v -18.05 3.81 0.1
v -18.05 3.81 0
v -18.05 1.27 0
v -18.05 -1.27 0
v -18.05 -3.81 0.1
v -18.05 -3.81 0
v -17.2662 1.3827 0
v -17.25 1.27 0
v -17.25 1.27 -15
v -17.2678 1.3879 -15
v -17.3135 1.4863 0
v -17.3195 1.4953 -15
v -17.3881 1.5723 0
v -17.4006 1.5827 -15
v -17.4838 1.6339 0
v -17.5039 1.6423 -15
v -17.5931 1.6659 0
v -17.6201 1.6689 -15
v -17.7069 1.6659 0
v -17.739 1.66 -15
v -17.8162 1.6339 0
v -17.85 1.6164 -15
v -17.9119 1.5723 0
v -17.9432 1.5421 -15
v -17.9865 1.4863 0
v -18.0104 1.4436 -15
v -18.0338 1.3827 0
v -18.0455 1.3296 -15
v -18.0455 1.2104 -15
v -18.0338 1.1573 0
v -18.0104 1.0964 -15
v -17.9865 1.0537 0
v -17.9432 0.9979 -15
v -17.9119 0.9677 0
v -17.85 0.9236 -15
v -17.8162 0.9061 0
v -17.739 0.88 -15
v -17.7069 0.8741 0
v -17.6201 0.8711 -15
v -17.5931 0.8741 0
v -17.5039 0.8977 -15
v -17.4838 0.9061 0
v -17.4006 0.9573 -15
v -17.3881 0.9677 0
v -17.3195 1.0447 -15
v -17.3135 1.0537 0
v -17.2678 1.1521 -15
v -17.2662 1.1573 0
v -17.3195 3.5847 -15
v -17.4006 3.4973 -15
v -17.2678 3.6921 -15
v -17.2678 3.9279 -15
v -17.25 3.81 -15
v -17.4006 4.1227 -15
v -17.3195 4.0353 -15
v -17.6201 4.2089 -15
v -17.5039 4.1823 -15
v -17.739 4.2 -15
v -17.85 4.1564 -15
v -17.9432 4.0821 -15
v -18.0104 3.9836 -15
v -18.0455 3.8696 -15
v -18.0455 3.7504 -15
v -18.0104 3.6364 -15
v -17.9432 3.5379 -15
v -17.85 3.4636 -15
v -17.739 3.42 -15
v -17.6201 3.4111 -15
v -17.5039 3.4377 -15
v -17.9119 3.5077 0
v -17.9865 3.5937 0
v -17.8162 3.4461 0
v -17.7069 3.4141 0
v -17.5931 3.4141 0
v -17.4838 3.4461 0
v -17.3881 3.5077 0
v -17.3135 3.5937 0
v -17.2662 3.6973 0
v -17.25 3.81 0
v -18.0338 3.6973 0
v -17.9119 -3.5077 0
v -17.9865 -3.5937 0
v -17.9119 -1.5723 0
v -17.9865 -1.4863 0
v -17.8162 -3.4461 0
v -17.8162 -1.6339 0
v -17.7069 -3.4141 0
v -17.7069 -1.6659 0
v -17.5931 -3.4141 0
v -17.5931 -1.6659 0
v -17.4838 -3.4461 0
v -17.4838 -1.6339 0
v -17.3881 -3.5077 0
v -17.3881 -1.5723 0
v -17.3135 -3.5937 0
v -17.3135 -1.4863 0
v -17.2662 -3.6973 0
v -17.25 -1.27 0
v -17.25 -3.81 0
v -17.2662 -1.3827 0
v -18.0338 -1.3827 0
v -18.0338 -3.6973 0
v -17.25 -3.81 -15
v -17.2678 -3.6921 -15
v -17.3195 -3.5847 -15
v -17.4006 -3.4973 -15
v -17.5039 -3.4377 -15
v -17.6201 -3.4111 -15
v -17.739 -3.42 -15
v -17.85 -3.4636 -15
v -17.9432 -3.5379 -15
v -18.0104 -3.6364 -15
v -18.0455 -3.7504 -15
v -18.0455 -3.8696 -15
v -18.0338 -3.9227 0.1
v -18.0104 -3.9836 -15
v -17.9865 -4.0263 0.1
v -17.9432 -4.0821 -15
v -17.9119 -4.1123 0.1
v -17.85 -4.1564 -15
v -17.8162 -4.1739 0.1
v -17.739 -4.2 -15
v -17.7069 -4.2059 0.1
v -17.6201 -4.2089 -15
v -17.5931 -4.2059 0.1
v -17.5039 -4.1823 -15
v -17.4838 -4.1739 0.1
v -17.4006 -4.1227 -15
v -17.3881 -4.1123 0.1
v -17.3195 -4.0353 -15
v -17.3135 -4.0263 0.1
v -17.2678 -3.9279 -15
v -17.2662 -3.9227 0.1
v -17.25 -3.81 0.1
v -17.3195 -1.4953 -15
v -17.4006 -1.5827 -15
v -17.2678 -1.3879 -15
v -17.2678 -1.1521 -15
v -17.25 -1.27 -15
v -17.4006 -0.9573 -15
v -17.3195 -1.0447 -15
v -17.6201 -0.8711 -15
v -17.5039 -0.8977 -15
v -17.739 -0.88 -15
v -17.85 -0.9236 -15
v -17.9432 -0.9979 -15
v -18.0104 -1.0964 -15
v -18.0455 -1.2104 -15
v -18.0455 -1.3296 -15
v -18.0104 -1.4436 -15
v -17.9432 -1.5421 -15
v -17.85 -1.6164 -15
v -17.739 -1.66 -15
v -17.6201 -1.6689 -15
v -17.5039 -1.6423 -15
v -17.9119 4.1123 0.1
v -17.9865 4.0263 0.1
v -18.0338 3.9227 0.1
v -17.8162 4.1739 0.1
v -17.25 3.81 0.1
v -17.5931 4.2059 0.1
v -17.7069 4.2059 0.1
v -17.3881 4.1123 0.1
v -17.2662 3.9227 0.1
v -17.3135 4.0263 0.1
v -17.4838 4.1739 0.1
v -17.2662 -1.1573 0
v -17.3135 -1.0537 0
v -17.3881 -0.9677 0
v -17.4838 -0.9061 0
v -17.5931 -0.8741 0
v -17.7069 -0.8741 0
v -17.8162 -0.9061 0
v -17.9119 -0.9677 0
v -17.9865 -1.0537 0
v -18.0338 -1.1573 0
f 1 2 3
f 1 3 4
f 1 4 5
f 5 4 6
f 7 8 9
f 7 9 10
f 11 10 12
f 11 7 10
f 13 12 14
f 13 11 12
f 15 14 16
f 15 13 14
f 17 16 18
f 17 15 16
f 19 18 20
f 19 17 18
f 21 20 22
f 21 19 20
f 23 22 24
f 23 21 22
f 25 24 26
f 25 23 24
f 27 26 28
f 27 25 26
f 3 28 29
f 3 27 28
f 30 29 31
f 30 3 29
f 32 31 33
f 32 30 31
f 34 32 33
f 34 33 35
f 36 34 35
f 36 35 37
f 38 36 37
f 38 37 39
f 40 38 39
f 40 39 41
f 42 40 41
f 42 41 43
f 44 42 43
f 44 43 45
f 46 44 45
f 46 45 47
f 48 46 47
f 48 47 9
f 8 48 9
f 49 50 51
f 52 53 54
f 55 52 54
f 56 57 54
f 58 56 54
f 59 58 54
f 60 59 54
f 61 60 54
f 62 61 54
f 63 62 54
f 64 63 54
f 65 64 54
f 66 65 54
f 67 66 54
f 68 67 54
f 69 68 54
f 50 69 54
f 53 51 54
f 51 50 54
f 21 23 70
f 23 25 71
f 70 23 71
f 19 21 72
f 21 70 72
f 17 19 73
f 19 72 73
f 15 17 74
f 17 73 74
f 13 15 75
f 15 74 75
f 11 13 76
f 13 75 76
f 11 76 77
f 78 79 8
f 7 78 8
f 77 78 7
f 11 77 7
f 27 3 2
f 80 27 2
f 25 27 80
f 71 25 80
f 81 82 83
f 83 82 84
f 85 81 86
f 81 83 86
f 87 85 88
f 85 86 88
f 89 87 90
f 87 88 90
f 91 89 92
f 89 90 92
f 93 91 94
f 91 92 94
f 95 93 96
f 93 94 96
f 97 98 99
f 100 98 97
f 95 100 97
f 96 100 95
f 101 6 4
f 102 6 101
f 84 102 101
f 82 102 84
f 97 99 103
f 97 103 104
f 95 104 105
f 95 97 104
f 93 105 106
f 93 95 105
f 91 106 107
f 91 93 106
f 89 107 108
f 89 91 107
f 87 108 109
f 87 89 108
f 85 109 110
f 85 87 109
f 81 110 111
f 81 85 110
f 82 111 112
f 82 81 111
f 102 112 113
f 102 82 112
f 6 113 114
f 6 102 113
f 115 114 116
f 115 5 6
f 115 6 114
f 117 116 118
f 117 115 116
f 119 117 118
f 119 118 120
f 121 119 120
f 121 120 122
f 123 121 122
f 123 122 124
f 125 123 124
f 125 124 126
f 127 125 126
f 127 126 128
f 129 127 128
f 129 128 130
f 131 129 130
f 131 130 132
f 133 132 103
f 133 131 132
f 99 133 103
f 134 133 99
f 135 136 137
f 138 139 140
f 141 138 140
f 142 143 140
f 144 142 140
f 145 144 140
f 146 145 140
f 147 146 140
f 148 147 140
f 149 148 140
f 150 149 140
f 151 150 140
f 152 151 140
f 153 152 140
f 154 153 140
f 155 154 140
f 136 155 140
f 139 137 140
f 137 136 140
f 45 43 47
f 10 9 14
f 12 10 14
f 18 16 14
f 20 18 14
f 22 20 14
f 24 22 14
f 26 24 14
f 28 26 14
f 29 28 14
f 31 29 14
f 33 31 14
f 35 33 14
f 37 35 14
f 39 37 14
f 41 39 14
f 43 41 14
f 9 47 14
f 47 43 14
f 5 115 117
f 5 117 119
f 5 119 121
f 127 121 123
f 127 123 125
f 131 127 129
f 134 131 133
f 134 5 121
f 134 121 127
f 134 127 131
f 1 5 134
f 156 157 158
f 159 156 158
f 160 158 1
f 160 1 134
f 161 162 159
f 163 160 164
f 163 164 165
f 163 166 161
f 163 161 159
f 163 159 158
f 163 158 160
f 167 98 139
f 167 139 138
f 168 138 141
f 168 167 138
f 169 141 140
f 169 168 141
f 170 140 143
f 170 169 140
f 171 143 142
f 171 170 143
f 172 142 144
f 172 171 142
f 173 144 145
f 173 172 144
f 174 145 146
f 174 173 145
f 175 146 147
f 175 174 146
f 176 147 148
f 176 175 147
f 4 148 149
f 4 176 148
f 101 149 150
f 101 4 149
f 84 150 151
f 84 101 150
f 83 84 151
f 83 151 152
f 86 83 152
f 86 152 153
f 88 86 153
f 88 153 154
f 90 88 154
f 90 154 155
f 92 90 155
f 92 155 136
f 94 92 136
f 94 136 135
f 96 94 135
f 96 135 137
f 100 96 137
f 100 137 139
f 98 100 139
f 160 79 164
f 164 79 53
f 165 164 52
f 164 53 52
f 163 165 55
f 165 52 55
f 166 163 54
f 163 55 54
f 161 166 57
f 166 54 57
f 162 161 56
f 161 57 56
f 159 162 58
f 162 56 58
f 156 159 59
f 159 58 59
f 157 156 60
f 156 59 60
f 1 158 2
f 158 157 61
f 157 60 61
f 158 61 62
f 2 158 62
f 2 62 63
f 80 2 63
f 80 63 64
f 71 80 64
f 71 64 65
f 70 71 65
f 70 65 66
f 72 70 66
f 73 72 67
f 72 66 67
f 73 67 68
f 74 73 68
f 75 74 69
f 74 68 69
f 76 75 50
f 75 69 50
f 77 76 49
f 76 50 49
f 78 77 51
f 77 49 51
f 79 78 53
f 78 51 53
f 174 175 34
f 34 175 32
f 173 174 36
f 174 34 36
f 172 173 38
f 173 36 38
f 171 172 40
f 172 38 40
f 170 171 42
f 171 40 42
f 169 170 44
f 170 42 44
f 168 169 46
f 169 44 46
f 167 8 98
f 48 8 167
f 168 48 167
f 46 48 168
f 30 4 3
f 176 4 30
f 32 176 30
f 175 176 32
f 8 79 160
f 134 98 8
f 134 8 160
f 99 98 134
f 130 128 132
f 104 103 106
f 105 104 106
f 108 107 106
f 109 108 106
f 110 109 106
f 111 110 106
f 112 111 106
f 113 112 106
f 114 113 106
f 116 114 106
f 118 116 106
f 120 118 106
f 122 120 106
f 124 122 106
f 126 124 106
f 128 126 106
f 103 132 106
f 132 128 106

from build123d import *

# Parameters (mm, degrees)
PAD005_DEPTH           = 0.1
SKETCH009_R            = 0.4
PAD006_DEPTH           = 15
LINEARPATTERN003_COUNT = 4
LINEARPATTERN003_PITCH = 2.54


with BuildPart() as part:
    # Sketch010 → Pad005 (new body)
    with BuildSketch(Plane.XY):
        with BuildLine():
            ThreePointArc((-17.25, 3.81), (-17.65, 4.21), (-18.05, 3.81))
            Line((-18.05, 3.81), (-18.05, -3.81))
            ThreePointArc((-18.05, -3.81), (-17.65, -4.21), (-17.25, -3.81))
            Line((-17.25, 3.81), (-17.25, -3.81))
        make_face()
    extrude(amount=PAD005_DEPTH)

    # Sketch009 → Pad006 (join)
    with BuildSketch(Plane.XY):
        with Locations((-17.65, -3.81)):
            Circle(SKETCH009_R)
    pad006 = extrude(amount=-PAD006_DEPTH)

    # LinearPattern003: Pad006 ×4
    with Locations(*[(0, i * LINEARPATTERN003_PITCH, 0) for i in range(1, LINEARPATTERN003_COUNT)]):
        add(pad006)


solid = part.part
